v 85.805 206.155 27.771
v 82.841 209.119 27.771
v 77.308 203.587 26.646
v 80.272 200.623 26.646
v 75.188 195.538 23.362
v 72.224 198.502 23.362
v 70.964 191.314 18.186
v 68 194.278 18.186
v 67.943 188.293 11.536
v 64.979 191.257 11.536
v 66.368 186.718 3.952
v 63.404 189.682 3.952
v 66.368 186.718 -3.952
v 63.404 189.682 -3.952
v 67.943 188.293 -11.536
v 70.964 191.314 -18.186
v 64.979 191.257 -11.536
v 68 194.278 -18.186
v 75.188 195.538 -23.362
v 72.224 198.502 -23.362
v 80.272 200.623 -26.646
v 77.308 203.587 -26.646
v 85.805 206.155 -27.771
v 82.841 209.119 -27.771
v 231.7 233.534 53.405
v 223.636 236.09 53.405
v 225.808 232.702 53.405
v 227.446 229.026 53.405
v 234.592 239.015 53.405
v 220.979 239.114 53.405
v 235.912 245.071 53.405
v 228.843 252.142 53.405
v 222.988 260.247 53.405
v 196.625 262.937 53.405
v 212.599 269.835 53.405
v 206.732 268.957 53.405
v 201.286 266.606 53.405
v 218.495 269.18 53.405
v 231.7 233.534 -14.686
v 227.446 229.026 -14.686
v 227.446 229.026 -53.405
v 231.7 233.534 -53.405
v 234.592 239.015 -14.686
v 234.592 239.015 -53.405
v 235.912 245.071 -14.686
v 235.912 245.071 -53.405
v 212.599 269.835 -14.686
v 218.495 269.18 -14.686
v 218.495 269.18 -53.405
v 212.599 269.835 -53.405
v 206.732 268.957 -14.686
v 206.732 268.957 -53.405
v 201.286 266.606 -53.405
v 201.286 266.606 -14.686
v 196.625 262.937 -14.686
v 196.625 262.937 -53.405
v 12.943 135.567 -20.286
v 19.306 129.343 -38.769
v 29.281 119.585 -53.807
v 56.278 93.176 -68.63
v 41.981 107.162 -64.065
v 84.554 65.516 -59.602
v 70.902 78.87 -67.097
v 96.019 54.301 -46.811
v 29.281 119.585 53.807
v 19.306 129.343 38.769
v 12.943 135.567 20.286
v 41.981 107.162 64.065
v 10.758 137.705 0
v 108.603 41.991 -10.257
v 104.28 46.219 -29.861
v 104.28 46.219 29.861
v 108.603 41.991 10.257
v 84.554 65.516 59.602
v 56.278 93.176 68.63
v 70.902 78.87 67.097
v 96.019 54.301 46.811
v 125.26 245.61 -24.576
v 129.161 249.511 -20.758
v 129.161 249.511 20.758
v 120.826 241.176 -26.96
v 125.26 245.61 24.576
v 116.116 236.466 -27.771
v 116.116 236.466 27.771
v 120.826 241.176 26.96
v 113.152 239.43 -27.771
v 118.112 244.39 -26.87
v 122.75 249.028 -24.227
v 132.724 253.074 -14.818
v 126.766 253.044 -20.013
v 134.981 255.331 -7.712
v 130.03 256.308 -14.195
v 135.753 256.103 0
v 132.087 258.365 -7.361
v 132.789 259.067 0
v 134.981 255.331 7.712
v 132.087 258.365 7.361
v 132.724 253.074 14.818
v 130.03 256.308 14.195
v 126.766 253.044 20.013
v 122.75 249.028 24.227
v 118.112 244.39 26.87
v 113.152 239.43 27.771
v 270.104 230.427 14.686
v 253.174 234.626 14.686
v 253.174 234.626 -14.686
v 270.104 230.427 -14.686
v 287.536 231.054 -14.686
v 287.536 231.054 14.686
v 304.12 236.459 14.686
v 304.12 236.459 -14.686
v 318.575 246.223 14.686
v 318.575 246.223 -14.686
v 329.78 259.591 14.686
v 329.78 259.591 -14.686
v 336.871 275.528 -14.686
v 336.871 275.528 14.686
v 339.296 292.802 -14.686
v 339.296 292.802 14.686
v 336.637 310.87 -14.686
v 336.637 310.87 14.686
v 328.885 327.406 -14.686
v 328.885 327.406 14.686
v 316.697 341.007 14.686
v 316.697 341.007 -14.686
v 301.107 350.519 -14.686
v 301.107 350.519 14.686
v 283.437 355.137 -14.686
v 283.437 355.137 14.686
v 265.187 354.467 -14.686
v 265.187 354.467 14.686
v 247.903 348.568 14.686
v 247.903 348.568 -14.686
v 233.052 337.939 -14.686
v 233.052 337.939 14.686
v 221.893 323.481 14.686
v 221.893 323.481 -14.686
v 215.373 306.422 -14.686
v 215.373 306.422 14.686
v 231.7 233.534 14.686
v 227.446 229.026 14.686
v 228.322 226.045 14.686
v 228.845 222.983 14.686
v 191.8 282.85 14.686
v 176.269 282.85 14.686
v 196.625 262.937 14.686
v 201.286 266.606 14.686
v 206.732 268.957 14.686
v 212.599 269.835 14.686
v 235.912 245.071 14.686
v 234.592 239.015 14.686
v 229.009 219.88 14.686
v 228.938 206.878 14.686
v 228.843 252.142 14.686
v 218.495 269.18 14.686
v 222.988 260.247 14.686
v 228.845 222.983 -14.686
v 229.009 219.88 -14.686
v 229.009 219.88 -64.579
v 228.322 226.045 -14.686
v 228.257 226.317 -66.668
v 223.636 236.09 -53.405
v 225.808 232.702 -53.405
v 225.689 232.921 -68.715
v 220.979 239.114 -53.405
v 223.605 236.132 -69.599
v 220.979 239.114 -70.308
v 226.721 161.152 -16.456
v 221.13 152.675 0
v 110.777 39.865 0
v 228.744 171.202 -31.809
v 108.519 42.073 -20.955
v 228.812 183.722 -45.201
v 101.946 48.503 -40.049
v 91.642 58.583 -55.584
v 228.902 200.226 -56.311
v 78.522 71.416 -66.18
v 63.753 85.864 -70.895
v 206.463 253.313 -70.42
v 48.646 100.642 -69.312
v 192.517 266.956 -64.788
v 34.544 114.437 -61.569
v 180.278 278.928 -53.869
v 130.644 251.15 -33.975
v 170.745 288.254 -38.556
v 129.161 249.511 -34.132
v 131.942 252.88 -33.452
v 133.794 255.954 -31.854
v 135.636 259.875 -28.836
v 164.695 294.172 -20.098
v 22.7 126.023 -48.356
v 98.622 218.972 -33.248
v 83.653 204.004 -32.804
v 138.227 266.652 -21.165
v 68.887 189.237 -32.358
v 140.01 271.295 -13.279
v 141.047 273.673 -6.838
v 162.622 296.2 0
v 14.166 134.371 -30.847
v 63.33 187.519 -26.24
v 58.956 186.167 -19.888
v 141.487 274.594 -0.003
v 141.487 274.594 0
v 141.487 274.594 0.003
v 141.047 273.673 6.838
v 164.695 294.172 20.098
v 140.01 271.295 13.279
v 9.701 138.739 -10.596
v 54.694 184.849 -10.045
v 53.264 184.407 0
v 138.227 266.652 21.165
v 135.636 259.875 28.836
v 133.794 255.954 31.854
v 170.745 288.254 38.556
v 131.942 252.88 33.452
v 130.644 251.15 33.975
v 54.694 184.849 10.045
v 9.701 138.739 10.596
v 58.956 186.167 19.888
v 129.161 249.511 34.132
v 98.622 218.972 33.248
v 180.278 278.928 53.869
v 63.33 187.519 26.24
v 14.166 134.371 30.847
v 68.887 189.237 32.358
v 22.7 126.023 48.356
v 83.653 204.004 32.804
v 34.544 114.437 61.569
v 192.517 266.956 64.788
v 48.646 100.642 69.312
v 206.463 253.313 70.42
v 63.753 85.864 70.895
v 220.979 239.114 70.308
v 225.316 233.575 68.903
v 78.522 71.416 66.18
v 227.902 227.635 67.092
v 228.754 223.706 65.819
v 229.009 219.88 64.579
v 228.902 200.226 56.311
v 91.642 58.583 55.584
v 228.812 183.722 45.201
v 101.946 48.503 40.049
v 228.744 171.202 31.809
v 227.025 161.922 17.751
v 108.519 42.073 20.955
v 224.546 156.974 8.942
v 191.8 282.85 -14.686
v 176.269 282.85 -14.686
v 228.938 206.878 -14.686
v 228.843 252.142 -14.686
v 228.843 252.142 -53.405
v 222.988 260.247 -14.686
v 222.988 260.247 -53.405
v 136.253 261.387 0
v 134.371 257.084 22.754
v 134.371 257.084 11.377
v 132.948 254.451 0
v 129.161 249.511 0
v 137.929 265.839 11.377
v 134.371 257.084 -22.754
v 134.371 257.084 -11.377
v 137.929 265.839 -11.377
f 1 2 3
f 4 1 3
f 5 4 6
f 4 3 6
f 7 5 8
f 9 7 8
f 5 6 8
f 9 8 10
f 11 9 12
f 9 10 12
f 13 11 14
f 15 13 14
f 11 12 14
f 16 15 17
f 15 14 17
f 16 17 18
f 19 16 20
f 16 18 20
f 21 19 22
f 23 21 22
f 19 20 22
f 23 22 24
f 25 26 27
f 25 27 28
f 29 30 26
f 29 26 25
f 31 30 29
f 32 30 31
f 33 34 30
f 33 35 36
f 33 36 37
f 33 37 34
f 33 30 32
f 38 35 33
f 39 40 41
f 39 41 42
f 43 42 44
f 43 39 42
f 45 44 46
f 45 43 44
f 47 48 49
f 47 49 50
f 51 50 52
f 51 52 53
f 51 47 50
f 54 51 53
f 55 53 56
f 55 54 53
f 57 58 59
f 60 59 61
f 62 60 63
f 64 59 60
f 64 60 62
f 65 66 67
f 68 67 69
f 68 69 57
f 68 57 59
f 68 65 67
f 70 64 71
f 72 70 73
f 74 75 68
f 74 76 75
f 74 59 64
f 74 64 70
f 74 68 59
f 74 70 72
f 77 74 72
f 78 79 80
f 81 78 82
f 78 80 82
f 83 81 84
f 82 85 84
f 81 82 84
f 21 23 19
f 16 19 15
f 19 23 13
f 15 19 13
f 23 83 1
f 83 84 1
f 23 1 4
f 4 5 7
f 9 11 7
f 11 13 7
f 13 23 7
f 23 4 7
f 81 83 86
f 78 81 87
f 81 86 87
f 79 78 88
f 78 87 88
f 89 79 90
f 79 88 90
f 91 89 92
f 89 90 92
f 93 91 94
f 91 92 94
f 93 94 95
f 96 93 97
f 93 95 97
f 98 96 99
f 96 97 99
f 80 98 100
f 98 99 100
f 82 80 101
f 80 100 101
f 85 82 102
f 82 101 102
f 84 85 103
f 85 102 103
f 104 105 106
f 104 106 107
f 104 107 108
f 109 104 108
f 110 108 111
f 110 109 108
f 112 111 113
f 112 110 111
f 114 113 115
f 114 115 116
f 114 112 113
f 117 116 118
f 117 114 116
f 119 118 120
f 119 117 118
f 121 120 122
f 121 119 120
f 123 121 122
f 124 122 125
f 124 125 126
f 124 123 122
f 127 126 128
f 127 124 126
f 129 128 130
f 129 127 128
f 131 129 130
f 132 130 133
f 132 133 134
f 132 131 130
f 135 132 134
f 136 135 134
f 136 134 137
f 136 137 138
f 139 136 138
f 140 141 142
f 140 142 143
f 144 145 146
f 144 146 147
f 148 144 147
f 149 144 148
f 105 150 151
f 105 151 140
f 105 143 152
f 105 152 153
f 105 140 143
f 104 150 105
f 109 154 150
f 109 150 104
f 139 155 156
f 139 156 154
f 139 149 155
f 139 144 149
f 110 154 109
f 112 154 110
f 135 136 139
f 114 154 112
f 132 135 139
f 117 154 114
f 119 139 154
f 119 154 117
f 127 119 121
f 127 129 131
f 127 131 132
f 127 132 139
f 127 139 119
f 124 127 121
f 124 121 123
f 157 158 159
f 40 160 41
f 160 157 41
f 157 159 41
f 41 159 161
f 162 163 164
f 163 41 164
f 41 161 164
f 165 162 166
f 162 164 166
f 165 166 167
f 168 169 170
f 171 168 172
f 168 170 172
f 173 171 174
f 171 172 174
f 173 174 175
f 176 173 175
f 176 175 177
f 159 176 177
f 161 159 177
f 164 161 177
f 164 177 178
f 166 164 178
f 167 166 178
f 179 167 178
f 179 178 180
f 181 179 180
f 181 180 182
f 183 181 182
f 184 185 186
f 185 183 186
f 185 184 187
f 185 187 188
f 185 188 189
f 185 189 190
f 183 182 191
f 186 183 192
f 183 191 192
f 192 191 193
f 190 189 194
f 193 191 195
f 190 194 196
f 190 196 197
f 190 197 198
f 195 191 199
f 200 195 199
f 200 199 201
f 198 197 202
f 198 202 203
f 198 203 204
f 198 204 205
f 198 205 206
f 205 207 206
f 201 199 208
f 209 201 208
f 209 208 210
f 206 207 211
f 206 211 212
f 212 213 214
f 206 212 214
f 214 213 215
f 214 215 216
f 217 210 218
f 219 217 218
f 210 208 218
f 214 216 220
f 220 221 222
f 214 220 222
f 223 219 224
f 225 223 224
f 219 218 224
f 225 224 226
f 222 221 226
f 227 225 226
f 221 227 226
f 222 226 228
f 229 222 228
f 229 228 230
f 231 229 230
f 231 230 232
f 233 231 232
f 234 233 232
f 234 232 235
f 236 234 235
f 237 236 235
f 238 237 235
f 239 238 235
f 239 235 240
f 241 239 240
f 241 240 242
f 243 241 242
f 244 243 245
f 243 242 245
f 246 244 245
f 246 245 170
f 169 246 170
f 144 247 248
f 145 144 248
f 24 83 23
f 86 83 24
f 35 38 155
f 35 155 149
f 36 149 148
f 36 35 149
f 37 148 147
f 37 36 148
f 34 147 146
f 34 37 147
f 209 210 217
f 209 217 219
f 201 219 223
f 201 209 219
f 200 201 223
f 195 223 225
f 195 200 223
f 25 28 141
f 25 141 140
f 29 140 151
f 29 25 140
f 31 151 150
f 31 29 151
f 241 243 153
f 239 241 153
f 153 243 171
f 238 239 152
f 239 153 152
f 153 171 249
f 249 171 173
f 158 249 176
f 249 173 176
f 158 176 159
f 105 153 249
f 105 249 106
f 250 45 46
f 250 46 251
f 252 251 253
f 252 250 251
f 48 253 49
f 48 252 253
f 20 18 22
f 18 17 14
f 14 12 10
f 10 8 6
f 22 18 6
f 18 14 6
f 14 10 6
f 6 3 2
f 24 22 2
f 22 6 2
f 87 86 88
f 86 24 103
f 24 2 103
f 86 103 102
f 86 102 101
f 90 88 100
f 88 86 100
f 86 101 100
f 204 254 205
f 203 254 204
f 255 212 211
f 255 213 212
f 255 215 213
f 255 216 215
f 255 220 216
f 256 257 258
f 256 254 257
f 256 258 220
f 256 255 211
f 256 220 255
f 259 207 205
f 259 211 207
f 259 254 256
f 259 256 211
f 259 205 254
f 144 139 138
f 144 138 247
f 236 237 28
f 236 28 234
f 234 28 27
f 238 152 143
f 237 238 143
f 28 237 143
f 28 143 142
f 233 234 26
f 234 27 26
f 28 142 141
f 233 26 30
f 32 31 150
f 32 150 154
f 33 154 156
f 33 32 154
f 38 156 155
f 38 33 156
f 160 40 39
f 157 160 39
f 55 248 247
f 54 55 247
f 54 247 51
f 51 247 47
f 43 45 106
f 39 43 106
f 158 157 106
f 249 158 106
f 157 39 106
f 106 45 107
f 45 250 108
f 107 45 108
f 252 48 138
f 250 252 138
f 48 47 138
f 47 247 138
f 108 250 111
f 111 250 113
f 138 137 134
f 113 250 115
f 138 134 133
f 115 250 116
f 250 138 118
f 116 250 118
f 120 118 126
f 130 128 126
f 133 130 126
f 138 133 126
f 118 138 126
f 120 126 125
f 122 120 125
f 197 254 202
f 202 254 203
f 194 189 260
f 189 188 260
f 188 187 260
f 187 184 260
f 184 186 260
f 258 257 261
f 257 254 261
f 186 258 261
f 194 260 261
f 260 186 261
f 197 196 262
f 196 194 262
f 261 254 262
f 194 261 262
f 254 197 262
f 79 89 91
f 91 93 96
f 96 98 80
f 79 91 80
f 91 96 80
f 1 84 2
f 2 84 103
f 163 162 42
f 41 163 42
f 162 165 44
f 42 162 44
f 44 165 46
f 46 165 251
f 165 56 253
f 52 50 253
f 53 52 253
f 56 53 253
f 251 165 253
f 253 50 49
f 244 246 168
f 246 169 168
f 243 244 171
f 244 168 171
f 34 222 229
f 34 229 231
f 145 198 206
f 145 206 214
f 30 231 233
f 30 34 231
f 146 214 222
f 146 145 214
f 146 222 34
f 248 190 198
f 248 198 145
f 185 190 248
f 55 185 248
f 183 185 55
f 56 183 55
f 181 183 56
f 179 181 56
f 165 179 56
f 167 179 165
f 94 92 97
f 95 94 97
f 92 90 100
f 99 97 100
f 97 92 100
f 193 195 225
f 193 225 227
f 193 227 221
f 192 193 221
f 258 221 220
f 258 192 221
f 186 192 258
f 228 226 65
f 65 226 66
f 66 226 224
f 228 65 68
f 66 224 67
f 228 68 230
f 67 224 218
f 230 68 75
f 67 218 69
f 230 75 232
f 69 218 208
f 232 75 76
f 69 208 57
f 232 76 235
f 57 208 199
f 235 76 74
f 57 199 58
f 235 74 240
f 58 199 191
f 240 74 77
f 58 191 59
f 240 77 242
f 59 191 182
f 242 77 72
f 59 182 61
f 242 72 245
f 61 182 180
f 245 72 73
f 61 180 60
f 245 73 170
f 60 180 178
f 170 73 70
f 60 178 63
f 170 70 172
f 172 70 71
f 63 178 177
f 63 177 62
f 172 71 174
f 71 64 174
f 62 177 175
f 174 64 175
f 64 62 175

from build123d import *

# Parameters (mm, degrees)
SKETCH2_R               = 34.7138244
BOSS_EXTRUDE1_DEPTH     = 43.3659661
FILLET1_R               = 2.54
SKETCH4_R               = 34.7138244
CUT_EXTRUDE1_DEPTH      = 6.985
SKETCH5_R               = 33.813098677
BOSS_EXTRUDE2_DEPTH     = 104.394
CUT_EXTRUDE2_DEPTH      = 44.3659661
CUT_EXTRUDE2_DEPTH_BACK = 44.3659662
BOSS_EXTRUDE3_DEPTH     = 13.208
BOSS_EXTRUDE6_DEPTH     = 25.4
BOSS_EXTRUDE7_DEPTH     = 6.985
CUT_EXTRUDE3_DEPTH      = 44.3659661
CUT_EXTRUDE3_DEPTH_BACK = 44.3659662
CUT_EXTRUDE6_DEPTH      = 1.993615
SCALE2_SCALE            = 2.1025641


with BuildPart() as part:
    # Sketch2 → Boss-Extrude1 (new body, symmetric)
    with BuildSketch(Plane.XY):
        with Locations((-4.885886043, 8.460037767)):
            Circle(SKETCH2_R)
    extrude(amount=BOSS_EXTRUDE1_DEPTH, both=True)

    # Sketch3 → Revolve1 (revolve)
    with BuildSketch(Plane.XY):
        with BuildLine():
            Line((22.617188767, -2.954559536), (39.991940689, 15.756711766))
            ThreePointArc((39.991940689, 15.756711766), (40.875583615, 16.161668708), (41.78676132, 15.823186604))
            Line((41.78676132, 15.823186604), (42.898157249, 14.791176098))
            Line((42.898157249, 14.791176098), (48.074161234, 14.791176098))
            ThreePointArc((48.074161234, 14.791176098), (48.566620636, 14.890542194), (48.982018985, 15.173091472))
            Line((48.982018985, 15.173091472), (52.064778569, 18.324488421))
            Line((52.064778569, 18.324488421), (51.292291814, 19.080150428))
            Line((51.292291814, 19.080150428), (51.913951053, 19.715650854))
            Line((51.913951053, 19.715650854), (28.515190783, 42.604786571))
            Line((28.515190783, 42.604786571), (2.85696712, 16.37528486))
            Line((2.85696712, 16.37528486), (22.617188767, -2.954559536))
        make_face()
    revolve(axis=Axis((2.85696712, 16.37528486, 0), (0.699279233, 0.714848623, 0)))

    # Fillet1
    fillet1_edges = [part.edges().sort_by_distance(p)[0] for p in [
        (-39.599710443, 8.460037767, 43.3659661),
    ]]
    fillet(fillet1_edges, radius=FILLET1_R)

    # Sketch4 → Cut-Extrude1 (cut, symmetric)
    with BuildSketch(Plane.XY):
        with Locations((-4.885886043, 8.460037767)):
            Circle(SKETCH4_R)
    extrude(amount=CUT_EXTRUDE1_DEPTH, both=True, mode=Mode.SUBTRACT)

    # Sketch5 → Boss-Extrude2 (add)
    with BuildSketch(Plane(origin=(35.240913845, 36.025549629, 0), x_dir=(0.714848623, -0.699279233, 0), z_dir=(0.699279233, 0.714848623, 0))):
        with Locations((-9.408597634, 0)):
            Circle(SKETCH5_R)
    extrude(amount=BOSS_EXTRUDE2_DEPTH)

    # Sketch6 → Cut-Extrude2 (cut, two sides)
    with BuildSketch(Plane.XY) as cut_extrude2_sk:
        with BuildLine():
            Line((67.292407195, 130.59958962), (25.332730461, 87.705684449))
            Line((25.332730461, 87.705684449), (32.763241022, 90.002936951))
            Line((32.763241022, 90.002936951), (61.430101704, 118.669797633))
            add(Edge.make_bspline(
                [(61.430101704, 118.669797633), (64.563138592, 121.802834521), (65.338305365, 126.622992291), (67.292407195, 130.59958962)],
                knots=[0, 0, 0, 0, 1, 1, 1, 1], degree=3))
        make_face()
        with BuildLine():
            Line((108.792818243, 81.425512643), (108.918686949, 104.5771561))
            ThreePointArc((108.918686949, 104.5771561), (107.938557068, 109.538955465), (105.099720902, 113.72477877))
            Line((105.099720902, 113.72477877), (125.686994108, 93.585895982))
            Line((125.686994108, 93.585895982), (105.171583442, 72.613711538))
            ThreePointArc((105.171583442, 72.613711538), (107.839772529, 76.66719056), (108.792818243, 81.425512643))
        make_face()
    extrude(amount=CUT_EXTRUDE2_DEPTH, mode=Mode.SUBTRACT)
    extrude(cut_extrude2_sk.sketch, amount=-CUT_EXTRUDE2_DEPTH_BACK, mode=Mode.SUBTRACT)

    # Sketch12 → Boss-Extrude6 (add, symmetric)
    with BuildSketch(Plane.XY):
        with BuildLine():
            Line((93.516859048, 125.055366113), (105.099720902, 113.72477877))
            ThreePointArc((105.099720902, 113.72477877), (106.910314157, 111.50062472), (108.175689127, 108.926924007))
            ThreePointArc((108.175689127, 108.926924007), (110.974870017, 112.327766266), (112.202154604, 116.558004353))
            ThreePointArc((112.202154604, 116.558004353), (107.370575878, 121.792992409), (103.918241878, 128.024416235))
            ThreePointArc((103.918241878, 128.024416235), (98.323942367, 127.918806427), (93.516859048, 125.055366113))
        make_face()
    extrude(amount=BOSS_EXTRUDE6_DEPTH, both=True)

    # Sketch12<3> → Boss-Extrude7 (add, symmetric)
    with BuildSketch(Plane.XY):
        with BuildLine():
            ThreePointArc((112.202154604, 116.558004353), (110.168783957, 123.814558681), (103.918241878, 128.024416235))
            ThreePointArc((103.918241878, 128.024416235), (107.370575878, 121.792992409), (112.202154604, 116.558004353))
        make_face()
        with BuildLine():
            ThreePointArc((102.433332077, 145.737270979), (101.825593785, 136.767653772), (103.918241878, 128.024416235))
            ThreePointArc((103.918241878, 128.024416235), (110.168783957, 123.814558681), (112.202154604, 116.558004353))
            ThreePointArc((112.202154604, 116.558004353), (116.105893598, 113.74176866), (120.411822358, 111.590178756))
            ThreePointArc((120.411822358, 111.590178756), (148.242172435, 114.54403237), (161.372696963, 139.259269819))
            ThreePointArc((161.372696963, 139.259269819), (134.805522913, 168.906416529), (102.433332077, 145.737270979))
        make_face()
        with BuildLine():
            Line((83.835311865, 134.526049383), (93.516859048, 125.055366113))
            ThreePointArc((93.516859048, 125.055366113), (98.323942367, 127.918806427), (103.918241878, 128.024416235))
            ThreePointArc((103.918241878, 128.024416235), (101.825593785, 136.767653772), (102.433332077, 145.737270979))
            Line((102.433332077, 145.737270979), (91.222110481, 134.526049383))
            Line((91.222110481, 134.526049383), (83.835311865, 134.526049383))
        make_face()
        with BuildLine():
            ThreePointArc((112.202154604, 116.558004353), (110.974870017, 112.327766266), (108.175689127, 108.926924007))
            ThreePointArc((108.175689127, 108.926924007), (108.737557935, 106.784557747), (108.918686949, 104.5771561))
            Line((108.918686949, 104.5771561), (108.885067656, 98.393396013))
            Line((108.885067656, 98.393396013), (120.411822358, 111.590178756))
            ThreePointArc((120.411822358, 111.590178756), (116.105893598, 113.74176866), (112.202154604, 116.558004353))
        make_face()
    extrude(amount=BOSS_EXTRUDE7_DEPTH, both=True)

    # Sketch13 → Cut-Extrude3 (cut, two sides)
    with BuildSketch(Plane.XY) as cut_extrude3_sk:
        Polygon((-11.059857652, 81.317891206), (67.08361219, 4.876384648), (-5.062145194, -68.87569155), (-83.205615037, 7.565815008), align=None)
    extrude(amount=CUT_EXTRUDE3_DEPTH, mode=Mode.SUBTRACT)
    extrude(cut_extrude3_sk.sketch, amount=-CUT_EXTRUDE3_DEPTH_BACK, mode=Mode.SUBTRACT)


with BuildPart() as body_2:
    # Sketch8 → Boss-Extrude3 (new body, symmetric)
    with BuildSketch(Plane.XY):
        Polygon((31.287985123, 88.527681052), (29.878286463, 89.937379712), (60.29118565, 120.350278899), (63.299006413, 123.358099663), (64.708705073, 121.948401003), (61.430101704, 118.669797633), align=None)
    extrude(amount=BOSS_EXTRUDE3_DEPTH, both=True)

    # Sketch15 → Cut-Extrude6 (cut)
    with BuildSketch(Plane(origin=(-30.029546625, 30.029546625, 0), x_dir=(0, 0, 1), z_dir=(-0.707106781, 0.707106781, 0))):
        with BuildLine():
            ThreePointArc((13.208, 98.188075554), (0, 84.980075554), (-13.208, 98.188075554))
            Line((-13.208, 98.188075554), (-13.208, 84.722470044))
            Line((-13.208, 84.722470044), (13.208, 84.722470044))
            Line((13.208, 84.722470044), (13.208, 98.188075554))
        make_face()
        with BuildLine():
            Line((13.208, 131.986505463), (-13.208, 131.986505463))
            Line((-13.208, 131.986505463), (-13.208, 127.349860112))
            Line((-13.208, 127.349860112), (-13.208, 118.57593923))
            ThreePointArc((-13.208, 118.57593923), (0, 131.78393923), (13.208, 118.57593923))
            Line((13.208, 118.57593923), (13.208, 131.986505463))
        make_face()
    extrude(amount=-CUT_EXTRUDE6_DEPTH, mode=Mode.SUBTRACT)


with BuildPart() as body_2_1:
    # Scale2: scaled about (0, 0, 0)
    add(body_2.part.scale(SCALE2_SCALE))


with BuildPart() as part_1:
    # Scale2: scaled about (0, 0, 0)
    add(part.part.scale(SCALE2_SCALE))


solid = Compound([body_2_1.part, part_1.part])
